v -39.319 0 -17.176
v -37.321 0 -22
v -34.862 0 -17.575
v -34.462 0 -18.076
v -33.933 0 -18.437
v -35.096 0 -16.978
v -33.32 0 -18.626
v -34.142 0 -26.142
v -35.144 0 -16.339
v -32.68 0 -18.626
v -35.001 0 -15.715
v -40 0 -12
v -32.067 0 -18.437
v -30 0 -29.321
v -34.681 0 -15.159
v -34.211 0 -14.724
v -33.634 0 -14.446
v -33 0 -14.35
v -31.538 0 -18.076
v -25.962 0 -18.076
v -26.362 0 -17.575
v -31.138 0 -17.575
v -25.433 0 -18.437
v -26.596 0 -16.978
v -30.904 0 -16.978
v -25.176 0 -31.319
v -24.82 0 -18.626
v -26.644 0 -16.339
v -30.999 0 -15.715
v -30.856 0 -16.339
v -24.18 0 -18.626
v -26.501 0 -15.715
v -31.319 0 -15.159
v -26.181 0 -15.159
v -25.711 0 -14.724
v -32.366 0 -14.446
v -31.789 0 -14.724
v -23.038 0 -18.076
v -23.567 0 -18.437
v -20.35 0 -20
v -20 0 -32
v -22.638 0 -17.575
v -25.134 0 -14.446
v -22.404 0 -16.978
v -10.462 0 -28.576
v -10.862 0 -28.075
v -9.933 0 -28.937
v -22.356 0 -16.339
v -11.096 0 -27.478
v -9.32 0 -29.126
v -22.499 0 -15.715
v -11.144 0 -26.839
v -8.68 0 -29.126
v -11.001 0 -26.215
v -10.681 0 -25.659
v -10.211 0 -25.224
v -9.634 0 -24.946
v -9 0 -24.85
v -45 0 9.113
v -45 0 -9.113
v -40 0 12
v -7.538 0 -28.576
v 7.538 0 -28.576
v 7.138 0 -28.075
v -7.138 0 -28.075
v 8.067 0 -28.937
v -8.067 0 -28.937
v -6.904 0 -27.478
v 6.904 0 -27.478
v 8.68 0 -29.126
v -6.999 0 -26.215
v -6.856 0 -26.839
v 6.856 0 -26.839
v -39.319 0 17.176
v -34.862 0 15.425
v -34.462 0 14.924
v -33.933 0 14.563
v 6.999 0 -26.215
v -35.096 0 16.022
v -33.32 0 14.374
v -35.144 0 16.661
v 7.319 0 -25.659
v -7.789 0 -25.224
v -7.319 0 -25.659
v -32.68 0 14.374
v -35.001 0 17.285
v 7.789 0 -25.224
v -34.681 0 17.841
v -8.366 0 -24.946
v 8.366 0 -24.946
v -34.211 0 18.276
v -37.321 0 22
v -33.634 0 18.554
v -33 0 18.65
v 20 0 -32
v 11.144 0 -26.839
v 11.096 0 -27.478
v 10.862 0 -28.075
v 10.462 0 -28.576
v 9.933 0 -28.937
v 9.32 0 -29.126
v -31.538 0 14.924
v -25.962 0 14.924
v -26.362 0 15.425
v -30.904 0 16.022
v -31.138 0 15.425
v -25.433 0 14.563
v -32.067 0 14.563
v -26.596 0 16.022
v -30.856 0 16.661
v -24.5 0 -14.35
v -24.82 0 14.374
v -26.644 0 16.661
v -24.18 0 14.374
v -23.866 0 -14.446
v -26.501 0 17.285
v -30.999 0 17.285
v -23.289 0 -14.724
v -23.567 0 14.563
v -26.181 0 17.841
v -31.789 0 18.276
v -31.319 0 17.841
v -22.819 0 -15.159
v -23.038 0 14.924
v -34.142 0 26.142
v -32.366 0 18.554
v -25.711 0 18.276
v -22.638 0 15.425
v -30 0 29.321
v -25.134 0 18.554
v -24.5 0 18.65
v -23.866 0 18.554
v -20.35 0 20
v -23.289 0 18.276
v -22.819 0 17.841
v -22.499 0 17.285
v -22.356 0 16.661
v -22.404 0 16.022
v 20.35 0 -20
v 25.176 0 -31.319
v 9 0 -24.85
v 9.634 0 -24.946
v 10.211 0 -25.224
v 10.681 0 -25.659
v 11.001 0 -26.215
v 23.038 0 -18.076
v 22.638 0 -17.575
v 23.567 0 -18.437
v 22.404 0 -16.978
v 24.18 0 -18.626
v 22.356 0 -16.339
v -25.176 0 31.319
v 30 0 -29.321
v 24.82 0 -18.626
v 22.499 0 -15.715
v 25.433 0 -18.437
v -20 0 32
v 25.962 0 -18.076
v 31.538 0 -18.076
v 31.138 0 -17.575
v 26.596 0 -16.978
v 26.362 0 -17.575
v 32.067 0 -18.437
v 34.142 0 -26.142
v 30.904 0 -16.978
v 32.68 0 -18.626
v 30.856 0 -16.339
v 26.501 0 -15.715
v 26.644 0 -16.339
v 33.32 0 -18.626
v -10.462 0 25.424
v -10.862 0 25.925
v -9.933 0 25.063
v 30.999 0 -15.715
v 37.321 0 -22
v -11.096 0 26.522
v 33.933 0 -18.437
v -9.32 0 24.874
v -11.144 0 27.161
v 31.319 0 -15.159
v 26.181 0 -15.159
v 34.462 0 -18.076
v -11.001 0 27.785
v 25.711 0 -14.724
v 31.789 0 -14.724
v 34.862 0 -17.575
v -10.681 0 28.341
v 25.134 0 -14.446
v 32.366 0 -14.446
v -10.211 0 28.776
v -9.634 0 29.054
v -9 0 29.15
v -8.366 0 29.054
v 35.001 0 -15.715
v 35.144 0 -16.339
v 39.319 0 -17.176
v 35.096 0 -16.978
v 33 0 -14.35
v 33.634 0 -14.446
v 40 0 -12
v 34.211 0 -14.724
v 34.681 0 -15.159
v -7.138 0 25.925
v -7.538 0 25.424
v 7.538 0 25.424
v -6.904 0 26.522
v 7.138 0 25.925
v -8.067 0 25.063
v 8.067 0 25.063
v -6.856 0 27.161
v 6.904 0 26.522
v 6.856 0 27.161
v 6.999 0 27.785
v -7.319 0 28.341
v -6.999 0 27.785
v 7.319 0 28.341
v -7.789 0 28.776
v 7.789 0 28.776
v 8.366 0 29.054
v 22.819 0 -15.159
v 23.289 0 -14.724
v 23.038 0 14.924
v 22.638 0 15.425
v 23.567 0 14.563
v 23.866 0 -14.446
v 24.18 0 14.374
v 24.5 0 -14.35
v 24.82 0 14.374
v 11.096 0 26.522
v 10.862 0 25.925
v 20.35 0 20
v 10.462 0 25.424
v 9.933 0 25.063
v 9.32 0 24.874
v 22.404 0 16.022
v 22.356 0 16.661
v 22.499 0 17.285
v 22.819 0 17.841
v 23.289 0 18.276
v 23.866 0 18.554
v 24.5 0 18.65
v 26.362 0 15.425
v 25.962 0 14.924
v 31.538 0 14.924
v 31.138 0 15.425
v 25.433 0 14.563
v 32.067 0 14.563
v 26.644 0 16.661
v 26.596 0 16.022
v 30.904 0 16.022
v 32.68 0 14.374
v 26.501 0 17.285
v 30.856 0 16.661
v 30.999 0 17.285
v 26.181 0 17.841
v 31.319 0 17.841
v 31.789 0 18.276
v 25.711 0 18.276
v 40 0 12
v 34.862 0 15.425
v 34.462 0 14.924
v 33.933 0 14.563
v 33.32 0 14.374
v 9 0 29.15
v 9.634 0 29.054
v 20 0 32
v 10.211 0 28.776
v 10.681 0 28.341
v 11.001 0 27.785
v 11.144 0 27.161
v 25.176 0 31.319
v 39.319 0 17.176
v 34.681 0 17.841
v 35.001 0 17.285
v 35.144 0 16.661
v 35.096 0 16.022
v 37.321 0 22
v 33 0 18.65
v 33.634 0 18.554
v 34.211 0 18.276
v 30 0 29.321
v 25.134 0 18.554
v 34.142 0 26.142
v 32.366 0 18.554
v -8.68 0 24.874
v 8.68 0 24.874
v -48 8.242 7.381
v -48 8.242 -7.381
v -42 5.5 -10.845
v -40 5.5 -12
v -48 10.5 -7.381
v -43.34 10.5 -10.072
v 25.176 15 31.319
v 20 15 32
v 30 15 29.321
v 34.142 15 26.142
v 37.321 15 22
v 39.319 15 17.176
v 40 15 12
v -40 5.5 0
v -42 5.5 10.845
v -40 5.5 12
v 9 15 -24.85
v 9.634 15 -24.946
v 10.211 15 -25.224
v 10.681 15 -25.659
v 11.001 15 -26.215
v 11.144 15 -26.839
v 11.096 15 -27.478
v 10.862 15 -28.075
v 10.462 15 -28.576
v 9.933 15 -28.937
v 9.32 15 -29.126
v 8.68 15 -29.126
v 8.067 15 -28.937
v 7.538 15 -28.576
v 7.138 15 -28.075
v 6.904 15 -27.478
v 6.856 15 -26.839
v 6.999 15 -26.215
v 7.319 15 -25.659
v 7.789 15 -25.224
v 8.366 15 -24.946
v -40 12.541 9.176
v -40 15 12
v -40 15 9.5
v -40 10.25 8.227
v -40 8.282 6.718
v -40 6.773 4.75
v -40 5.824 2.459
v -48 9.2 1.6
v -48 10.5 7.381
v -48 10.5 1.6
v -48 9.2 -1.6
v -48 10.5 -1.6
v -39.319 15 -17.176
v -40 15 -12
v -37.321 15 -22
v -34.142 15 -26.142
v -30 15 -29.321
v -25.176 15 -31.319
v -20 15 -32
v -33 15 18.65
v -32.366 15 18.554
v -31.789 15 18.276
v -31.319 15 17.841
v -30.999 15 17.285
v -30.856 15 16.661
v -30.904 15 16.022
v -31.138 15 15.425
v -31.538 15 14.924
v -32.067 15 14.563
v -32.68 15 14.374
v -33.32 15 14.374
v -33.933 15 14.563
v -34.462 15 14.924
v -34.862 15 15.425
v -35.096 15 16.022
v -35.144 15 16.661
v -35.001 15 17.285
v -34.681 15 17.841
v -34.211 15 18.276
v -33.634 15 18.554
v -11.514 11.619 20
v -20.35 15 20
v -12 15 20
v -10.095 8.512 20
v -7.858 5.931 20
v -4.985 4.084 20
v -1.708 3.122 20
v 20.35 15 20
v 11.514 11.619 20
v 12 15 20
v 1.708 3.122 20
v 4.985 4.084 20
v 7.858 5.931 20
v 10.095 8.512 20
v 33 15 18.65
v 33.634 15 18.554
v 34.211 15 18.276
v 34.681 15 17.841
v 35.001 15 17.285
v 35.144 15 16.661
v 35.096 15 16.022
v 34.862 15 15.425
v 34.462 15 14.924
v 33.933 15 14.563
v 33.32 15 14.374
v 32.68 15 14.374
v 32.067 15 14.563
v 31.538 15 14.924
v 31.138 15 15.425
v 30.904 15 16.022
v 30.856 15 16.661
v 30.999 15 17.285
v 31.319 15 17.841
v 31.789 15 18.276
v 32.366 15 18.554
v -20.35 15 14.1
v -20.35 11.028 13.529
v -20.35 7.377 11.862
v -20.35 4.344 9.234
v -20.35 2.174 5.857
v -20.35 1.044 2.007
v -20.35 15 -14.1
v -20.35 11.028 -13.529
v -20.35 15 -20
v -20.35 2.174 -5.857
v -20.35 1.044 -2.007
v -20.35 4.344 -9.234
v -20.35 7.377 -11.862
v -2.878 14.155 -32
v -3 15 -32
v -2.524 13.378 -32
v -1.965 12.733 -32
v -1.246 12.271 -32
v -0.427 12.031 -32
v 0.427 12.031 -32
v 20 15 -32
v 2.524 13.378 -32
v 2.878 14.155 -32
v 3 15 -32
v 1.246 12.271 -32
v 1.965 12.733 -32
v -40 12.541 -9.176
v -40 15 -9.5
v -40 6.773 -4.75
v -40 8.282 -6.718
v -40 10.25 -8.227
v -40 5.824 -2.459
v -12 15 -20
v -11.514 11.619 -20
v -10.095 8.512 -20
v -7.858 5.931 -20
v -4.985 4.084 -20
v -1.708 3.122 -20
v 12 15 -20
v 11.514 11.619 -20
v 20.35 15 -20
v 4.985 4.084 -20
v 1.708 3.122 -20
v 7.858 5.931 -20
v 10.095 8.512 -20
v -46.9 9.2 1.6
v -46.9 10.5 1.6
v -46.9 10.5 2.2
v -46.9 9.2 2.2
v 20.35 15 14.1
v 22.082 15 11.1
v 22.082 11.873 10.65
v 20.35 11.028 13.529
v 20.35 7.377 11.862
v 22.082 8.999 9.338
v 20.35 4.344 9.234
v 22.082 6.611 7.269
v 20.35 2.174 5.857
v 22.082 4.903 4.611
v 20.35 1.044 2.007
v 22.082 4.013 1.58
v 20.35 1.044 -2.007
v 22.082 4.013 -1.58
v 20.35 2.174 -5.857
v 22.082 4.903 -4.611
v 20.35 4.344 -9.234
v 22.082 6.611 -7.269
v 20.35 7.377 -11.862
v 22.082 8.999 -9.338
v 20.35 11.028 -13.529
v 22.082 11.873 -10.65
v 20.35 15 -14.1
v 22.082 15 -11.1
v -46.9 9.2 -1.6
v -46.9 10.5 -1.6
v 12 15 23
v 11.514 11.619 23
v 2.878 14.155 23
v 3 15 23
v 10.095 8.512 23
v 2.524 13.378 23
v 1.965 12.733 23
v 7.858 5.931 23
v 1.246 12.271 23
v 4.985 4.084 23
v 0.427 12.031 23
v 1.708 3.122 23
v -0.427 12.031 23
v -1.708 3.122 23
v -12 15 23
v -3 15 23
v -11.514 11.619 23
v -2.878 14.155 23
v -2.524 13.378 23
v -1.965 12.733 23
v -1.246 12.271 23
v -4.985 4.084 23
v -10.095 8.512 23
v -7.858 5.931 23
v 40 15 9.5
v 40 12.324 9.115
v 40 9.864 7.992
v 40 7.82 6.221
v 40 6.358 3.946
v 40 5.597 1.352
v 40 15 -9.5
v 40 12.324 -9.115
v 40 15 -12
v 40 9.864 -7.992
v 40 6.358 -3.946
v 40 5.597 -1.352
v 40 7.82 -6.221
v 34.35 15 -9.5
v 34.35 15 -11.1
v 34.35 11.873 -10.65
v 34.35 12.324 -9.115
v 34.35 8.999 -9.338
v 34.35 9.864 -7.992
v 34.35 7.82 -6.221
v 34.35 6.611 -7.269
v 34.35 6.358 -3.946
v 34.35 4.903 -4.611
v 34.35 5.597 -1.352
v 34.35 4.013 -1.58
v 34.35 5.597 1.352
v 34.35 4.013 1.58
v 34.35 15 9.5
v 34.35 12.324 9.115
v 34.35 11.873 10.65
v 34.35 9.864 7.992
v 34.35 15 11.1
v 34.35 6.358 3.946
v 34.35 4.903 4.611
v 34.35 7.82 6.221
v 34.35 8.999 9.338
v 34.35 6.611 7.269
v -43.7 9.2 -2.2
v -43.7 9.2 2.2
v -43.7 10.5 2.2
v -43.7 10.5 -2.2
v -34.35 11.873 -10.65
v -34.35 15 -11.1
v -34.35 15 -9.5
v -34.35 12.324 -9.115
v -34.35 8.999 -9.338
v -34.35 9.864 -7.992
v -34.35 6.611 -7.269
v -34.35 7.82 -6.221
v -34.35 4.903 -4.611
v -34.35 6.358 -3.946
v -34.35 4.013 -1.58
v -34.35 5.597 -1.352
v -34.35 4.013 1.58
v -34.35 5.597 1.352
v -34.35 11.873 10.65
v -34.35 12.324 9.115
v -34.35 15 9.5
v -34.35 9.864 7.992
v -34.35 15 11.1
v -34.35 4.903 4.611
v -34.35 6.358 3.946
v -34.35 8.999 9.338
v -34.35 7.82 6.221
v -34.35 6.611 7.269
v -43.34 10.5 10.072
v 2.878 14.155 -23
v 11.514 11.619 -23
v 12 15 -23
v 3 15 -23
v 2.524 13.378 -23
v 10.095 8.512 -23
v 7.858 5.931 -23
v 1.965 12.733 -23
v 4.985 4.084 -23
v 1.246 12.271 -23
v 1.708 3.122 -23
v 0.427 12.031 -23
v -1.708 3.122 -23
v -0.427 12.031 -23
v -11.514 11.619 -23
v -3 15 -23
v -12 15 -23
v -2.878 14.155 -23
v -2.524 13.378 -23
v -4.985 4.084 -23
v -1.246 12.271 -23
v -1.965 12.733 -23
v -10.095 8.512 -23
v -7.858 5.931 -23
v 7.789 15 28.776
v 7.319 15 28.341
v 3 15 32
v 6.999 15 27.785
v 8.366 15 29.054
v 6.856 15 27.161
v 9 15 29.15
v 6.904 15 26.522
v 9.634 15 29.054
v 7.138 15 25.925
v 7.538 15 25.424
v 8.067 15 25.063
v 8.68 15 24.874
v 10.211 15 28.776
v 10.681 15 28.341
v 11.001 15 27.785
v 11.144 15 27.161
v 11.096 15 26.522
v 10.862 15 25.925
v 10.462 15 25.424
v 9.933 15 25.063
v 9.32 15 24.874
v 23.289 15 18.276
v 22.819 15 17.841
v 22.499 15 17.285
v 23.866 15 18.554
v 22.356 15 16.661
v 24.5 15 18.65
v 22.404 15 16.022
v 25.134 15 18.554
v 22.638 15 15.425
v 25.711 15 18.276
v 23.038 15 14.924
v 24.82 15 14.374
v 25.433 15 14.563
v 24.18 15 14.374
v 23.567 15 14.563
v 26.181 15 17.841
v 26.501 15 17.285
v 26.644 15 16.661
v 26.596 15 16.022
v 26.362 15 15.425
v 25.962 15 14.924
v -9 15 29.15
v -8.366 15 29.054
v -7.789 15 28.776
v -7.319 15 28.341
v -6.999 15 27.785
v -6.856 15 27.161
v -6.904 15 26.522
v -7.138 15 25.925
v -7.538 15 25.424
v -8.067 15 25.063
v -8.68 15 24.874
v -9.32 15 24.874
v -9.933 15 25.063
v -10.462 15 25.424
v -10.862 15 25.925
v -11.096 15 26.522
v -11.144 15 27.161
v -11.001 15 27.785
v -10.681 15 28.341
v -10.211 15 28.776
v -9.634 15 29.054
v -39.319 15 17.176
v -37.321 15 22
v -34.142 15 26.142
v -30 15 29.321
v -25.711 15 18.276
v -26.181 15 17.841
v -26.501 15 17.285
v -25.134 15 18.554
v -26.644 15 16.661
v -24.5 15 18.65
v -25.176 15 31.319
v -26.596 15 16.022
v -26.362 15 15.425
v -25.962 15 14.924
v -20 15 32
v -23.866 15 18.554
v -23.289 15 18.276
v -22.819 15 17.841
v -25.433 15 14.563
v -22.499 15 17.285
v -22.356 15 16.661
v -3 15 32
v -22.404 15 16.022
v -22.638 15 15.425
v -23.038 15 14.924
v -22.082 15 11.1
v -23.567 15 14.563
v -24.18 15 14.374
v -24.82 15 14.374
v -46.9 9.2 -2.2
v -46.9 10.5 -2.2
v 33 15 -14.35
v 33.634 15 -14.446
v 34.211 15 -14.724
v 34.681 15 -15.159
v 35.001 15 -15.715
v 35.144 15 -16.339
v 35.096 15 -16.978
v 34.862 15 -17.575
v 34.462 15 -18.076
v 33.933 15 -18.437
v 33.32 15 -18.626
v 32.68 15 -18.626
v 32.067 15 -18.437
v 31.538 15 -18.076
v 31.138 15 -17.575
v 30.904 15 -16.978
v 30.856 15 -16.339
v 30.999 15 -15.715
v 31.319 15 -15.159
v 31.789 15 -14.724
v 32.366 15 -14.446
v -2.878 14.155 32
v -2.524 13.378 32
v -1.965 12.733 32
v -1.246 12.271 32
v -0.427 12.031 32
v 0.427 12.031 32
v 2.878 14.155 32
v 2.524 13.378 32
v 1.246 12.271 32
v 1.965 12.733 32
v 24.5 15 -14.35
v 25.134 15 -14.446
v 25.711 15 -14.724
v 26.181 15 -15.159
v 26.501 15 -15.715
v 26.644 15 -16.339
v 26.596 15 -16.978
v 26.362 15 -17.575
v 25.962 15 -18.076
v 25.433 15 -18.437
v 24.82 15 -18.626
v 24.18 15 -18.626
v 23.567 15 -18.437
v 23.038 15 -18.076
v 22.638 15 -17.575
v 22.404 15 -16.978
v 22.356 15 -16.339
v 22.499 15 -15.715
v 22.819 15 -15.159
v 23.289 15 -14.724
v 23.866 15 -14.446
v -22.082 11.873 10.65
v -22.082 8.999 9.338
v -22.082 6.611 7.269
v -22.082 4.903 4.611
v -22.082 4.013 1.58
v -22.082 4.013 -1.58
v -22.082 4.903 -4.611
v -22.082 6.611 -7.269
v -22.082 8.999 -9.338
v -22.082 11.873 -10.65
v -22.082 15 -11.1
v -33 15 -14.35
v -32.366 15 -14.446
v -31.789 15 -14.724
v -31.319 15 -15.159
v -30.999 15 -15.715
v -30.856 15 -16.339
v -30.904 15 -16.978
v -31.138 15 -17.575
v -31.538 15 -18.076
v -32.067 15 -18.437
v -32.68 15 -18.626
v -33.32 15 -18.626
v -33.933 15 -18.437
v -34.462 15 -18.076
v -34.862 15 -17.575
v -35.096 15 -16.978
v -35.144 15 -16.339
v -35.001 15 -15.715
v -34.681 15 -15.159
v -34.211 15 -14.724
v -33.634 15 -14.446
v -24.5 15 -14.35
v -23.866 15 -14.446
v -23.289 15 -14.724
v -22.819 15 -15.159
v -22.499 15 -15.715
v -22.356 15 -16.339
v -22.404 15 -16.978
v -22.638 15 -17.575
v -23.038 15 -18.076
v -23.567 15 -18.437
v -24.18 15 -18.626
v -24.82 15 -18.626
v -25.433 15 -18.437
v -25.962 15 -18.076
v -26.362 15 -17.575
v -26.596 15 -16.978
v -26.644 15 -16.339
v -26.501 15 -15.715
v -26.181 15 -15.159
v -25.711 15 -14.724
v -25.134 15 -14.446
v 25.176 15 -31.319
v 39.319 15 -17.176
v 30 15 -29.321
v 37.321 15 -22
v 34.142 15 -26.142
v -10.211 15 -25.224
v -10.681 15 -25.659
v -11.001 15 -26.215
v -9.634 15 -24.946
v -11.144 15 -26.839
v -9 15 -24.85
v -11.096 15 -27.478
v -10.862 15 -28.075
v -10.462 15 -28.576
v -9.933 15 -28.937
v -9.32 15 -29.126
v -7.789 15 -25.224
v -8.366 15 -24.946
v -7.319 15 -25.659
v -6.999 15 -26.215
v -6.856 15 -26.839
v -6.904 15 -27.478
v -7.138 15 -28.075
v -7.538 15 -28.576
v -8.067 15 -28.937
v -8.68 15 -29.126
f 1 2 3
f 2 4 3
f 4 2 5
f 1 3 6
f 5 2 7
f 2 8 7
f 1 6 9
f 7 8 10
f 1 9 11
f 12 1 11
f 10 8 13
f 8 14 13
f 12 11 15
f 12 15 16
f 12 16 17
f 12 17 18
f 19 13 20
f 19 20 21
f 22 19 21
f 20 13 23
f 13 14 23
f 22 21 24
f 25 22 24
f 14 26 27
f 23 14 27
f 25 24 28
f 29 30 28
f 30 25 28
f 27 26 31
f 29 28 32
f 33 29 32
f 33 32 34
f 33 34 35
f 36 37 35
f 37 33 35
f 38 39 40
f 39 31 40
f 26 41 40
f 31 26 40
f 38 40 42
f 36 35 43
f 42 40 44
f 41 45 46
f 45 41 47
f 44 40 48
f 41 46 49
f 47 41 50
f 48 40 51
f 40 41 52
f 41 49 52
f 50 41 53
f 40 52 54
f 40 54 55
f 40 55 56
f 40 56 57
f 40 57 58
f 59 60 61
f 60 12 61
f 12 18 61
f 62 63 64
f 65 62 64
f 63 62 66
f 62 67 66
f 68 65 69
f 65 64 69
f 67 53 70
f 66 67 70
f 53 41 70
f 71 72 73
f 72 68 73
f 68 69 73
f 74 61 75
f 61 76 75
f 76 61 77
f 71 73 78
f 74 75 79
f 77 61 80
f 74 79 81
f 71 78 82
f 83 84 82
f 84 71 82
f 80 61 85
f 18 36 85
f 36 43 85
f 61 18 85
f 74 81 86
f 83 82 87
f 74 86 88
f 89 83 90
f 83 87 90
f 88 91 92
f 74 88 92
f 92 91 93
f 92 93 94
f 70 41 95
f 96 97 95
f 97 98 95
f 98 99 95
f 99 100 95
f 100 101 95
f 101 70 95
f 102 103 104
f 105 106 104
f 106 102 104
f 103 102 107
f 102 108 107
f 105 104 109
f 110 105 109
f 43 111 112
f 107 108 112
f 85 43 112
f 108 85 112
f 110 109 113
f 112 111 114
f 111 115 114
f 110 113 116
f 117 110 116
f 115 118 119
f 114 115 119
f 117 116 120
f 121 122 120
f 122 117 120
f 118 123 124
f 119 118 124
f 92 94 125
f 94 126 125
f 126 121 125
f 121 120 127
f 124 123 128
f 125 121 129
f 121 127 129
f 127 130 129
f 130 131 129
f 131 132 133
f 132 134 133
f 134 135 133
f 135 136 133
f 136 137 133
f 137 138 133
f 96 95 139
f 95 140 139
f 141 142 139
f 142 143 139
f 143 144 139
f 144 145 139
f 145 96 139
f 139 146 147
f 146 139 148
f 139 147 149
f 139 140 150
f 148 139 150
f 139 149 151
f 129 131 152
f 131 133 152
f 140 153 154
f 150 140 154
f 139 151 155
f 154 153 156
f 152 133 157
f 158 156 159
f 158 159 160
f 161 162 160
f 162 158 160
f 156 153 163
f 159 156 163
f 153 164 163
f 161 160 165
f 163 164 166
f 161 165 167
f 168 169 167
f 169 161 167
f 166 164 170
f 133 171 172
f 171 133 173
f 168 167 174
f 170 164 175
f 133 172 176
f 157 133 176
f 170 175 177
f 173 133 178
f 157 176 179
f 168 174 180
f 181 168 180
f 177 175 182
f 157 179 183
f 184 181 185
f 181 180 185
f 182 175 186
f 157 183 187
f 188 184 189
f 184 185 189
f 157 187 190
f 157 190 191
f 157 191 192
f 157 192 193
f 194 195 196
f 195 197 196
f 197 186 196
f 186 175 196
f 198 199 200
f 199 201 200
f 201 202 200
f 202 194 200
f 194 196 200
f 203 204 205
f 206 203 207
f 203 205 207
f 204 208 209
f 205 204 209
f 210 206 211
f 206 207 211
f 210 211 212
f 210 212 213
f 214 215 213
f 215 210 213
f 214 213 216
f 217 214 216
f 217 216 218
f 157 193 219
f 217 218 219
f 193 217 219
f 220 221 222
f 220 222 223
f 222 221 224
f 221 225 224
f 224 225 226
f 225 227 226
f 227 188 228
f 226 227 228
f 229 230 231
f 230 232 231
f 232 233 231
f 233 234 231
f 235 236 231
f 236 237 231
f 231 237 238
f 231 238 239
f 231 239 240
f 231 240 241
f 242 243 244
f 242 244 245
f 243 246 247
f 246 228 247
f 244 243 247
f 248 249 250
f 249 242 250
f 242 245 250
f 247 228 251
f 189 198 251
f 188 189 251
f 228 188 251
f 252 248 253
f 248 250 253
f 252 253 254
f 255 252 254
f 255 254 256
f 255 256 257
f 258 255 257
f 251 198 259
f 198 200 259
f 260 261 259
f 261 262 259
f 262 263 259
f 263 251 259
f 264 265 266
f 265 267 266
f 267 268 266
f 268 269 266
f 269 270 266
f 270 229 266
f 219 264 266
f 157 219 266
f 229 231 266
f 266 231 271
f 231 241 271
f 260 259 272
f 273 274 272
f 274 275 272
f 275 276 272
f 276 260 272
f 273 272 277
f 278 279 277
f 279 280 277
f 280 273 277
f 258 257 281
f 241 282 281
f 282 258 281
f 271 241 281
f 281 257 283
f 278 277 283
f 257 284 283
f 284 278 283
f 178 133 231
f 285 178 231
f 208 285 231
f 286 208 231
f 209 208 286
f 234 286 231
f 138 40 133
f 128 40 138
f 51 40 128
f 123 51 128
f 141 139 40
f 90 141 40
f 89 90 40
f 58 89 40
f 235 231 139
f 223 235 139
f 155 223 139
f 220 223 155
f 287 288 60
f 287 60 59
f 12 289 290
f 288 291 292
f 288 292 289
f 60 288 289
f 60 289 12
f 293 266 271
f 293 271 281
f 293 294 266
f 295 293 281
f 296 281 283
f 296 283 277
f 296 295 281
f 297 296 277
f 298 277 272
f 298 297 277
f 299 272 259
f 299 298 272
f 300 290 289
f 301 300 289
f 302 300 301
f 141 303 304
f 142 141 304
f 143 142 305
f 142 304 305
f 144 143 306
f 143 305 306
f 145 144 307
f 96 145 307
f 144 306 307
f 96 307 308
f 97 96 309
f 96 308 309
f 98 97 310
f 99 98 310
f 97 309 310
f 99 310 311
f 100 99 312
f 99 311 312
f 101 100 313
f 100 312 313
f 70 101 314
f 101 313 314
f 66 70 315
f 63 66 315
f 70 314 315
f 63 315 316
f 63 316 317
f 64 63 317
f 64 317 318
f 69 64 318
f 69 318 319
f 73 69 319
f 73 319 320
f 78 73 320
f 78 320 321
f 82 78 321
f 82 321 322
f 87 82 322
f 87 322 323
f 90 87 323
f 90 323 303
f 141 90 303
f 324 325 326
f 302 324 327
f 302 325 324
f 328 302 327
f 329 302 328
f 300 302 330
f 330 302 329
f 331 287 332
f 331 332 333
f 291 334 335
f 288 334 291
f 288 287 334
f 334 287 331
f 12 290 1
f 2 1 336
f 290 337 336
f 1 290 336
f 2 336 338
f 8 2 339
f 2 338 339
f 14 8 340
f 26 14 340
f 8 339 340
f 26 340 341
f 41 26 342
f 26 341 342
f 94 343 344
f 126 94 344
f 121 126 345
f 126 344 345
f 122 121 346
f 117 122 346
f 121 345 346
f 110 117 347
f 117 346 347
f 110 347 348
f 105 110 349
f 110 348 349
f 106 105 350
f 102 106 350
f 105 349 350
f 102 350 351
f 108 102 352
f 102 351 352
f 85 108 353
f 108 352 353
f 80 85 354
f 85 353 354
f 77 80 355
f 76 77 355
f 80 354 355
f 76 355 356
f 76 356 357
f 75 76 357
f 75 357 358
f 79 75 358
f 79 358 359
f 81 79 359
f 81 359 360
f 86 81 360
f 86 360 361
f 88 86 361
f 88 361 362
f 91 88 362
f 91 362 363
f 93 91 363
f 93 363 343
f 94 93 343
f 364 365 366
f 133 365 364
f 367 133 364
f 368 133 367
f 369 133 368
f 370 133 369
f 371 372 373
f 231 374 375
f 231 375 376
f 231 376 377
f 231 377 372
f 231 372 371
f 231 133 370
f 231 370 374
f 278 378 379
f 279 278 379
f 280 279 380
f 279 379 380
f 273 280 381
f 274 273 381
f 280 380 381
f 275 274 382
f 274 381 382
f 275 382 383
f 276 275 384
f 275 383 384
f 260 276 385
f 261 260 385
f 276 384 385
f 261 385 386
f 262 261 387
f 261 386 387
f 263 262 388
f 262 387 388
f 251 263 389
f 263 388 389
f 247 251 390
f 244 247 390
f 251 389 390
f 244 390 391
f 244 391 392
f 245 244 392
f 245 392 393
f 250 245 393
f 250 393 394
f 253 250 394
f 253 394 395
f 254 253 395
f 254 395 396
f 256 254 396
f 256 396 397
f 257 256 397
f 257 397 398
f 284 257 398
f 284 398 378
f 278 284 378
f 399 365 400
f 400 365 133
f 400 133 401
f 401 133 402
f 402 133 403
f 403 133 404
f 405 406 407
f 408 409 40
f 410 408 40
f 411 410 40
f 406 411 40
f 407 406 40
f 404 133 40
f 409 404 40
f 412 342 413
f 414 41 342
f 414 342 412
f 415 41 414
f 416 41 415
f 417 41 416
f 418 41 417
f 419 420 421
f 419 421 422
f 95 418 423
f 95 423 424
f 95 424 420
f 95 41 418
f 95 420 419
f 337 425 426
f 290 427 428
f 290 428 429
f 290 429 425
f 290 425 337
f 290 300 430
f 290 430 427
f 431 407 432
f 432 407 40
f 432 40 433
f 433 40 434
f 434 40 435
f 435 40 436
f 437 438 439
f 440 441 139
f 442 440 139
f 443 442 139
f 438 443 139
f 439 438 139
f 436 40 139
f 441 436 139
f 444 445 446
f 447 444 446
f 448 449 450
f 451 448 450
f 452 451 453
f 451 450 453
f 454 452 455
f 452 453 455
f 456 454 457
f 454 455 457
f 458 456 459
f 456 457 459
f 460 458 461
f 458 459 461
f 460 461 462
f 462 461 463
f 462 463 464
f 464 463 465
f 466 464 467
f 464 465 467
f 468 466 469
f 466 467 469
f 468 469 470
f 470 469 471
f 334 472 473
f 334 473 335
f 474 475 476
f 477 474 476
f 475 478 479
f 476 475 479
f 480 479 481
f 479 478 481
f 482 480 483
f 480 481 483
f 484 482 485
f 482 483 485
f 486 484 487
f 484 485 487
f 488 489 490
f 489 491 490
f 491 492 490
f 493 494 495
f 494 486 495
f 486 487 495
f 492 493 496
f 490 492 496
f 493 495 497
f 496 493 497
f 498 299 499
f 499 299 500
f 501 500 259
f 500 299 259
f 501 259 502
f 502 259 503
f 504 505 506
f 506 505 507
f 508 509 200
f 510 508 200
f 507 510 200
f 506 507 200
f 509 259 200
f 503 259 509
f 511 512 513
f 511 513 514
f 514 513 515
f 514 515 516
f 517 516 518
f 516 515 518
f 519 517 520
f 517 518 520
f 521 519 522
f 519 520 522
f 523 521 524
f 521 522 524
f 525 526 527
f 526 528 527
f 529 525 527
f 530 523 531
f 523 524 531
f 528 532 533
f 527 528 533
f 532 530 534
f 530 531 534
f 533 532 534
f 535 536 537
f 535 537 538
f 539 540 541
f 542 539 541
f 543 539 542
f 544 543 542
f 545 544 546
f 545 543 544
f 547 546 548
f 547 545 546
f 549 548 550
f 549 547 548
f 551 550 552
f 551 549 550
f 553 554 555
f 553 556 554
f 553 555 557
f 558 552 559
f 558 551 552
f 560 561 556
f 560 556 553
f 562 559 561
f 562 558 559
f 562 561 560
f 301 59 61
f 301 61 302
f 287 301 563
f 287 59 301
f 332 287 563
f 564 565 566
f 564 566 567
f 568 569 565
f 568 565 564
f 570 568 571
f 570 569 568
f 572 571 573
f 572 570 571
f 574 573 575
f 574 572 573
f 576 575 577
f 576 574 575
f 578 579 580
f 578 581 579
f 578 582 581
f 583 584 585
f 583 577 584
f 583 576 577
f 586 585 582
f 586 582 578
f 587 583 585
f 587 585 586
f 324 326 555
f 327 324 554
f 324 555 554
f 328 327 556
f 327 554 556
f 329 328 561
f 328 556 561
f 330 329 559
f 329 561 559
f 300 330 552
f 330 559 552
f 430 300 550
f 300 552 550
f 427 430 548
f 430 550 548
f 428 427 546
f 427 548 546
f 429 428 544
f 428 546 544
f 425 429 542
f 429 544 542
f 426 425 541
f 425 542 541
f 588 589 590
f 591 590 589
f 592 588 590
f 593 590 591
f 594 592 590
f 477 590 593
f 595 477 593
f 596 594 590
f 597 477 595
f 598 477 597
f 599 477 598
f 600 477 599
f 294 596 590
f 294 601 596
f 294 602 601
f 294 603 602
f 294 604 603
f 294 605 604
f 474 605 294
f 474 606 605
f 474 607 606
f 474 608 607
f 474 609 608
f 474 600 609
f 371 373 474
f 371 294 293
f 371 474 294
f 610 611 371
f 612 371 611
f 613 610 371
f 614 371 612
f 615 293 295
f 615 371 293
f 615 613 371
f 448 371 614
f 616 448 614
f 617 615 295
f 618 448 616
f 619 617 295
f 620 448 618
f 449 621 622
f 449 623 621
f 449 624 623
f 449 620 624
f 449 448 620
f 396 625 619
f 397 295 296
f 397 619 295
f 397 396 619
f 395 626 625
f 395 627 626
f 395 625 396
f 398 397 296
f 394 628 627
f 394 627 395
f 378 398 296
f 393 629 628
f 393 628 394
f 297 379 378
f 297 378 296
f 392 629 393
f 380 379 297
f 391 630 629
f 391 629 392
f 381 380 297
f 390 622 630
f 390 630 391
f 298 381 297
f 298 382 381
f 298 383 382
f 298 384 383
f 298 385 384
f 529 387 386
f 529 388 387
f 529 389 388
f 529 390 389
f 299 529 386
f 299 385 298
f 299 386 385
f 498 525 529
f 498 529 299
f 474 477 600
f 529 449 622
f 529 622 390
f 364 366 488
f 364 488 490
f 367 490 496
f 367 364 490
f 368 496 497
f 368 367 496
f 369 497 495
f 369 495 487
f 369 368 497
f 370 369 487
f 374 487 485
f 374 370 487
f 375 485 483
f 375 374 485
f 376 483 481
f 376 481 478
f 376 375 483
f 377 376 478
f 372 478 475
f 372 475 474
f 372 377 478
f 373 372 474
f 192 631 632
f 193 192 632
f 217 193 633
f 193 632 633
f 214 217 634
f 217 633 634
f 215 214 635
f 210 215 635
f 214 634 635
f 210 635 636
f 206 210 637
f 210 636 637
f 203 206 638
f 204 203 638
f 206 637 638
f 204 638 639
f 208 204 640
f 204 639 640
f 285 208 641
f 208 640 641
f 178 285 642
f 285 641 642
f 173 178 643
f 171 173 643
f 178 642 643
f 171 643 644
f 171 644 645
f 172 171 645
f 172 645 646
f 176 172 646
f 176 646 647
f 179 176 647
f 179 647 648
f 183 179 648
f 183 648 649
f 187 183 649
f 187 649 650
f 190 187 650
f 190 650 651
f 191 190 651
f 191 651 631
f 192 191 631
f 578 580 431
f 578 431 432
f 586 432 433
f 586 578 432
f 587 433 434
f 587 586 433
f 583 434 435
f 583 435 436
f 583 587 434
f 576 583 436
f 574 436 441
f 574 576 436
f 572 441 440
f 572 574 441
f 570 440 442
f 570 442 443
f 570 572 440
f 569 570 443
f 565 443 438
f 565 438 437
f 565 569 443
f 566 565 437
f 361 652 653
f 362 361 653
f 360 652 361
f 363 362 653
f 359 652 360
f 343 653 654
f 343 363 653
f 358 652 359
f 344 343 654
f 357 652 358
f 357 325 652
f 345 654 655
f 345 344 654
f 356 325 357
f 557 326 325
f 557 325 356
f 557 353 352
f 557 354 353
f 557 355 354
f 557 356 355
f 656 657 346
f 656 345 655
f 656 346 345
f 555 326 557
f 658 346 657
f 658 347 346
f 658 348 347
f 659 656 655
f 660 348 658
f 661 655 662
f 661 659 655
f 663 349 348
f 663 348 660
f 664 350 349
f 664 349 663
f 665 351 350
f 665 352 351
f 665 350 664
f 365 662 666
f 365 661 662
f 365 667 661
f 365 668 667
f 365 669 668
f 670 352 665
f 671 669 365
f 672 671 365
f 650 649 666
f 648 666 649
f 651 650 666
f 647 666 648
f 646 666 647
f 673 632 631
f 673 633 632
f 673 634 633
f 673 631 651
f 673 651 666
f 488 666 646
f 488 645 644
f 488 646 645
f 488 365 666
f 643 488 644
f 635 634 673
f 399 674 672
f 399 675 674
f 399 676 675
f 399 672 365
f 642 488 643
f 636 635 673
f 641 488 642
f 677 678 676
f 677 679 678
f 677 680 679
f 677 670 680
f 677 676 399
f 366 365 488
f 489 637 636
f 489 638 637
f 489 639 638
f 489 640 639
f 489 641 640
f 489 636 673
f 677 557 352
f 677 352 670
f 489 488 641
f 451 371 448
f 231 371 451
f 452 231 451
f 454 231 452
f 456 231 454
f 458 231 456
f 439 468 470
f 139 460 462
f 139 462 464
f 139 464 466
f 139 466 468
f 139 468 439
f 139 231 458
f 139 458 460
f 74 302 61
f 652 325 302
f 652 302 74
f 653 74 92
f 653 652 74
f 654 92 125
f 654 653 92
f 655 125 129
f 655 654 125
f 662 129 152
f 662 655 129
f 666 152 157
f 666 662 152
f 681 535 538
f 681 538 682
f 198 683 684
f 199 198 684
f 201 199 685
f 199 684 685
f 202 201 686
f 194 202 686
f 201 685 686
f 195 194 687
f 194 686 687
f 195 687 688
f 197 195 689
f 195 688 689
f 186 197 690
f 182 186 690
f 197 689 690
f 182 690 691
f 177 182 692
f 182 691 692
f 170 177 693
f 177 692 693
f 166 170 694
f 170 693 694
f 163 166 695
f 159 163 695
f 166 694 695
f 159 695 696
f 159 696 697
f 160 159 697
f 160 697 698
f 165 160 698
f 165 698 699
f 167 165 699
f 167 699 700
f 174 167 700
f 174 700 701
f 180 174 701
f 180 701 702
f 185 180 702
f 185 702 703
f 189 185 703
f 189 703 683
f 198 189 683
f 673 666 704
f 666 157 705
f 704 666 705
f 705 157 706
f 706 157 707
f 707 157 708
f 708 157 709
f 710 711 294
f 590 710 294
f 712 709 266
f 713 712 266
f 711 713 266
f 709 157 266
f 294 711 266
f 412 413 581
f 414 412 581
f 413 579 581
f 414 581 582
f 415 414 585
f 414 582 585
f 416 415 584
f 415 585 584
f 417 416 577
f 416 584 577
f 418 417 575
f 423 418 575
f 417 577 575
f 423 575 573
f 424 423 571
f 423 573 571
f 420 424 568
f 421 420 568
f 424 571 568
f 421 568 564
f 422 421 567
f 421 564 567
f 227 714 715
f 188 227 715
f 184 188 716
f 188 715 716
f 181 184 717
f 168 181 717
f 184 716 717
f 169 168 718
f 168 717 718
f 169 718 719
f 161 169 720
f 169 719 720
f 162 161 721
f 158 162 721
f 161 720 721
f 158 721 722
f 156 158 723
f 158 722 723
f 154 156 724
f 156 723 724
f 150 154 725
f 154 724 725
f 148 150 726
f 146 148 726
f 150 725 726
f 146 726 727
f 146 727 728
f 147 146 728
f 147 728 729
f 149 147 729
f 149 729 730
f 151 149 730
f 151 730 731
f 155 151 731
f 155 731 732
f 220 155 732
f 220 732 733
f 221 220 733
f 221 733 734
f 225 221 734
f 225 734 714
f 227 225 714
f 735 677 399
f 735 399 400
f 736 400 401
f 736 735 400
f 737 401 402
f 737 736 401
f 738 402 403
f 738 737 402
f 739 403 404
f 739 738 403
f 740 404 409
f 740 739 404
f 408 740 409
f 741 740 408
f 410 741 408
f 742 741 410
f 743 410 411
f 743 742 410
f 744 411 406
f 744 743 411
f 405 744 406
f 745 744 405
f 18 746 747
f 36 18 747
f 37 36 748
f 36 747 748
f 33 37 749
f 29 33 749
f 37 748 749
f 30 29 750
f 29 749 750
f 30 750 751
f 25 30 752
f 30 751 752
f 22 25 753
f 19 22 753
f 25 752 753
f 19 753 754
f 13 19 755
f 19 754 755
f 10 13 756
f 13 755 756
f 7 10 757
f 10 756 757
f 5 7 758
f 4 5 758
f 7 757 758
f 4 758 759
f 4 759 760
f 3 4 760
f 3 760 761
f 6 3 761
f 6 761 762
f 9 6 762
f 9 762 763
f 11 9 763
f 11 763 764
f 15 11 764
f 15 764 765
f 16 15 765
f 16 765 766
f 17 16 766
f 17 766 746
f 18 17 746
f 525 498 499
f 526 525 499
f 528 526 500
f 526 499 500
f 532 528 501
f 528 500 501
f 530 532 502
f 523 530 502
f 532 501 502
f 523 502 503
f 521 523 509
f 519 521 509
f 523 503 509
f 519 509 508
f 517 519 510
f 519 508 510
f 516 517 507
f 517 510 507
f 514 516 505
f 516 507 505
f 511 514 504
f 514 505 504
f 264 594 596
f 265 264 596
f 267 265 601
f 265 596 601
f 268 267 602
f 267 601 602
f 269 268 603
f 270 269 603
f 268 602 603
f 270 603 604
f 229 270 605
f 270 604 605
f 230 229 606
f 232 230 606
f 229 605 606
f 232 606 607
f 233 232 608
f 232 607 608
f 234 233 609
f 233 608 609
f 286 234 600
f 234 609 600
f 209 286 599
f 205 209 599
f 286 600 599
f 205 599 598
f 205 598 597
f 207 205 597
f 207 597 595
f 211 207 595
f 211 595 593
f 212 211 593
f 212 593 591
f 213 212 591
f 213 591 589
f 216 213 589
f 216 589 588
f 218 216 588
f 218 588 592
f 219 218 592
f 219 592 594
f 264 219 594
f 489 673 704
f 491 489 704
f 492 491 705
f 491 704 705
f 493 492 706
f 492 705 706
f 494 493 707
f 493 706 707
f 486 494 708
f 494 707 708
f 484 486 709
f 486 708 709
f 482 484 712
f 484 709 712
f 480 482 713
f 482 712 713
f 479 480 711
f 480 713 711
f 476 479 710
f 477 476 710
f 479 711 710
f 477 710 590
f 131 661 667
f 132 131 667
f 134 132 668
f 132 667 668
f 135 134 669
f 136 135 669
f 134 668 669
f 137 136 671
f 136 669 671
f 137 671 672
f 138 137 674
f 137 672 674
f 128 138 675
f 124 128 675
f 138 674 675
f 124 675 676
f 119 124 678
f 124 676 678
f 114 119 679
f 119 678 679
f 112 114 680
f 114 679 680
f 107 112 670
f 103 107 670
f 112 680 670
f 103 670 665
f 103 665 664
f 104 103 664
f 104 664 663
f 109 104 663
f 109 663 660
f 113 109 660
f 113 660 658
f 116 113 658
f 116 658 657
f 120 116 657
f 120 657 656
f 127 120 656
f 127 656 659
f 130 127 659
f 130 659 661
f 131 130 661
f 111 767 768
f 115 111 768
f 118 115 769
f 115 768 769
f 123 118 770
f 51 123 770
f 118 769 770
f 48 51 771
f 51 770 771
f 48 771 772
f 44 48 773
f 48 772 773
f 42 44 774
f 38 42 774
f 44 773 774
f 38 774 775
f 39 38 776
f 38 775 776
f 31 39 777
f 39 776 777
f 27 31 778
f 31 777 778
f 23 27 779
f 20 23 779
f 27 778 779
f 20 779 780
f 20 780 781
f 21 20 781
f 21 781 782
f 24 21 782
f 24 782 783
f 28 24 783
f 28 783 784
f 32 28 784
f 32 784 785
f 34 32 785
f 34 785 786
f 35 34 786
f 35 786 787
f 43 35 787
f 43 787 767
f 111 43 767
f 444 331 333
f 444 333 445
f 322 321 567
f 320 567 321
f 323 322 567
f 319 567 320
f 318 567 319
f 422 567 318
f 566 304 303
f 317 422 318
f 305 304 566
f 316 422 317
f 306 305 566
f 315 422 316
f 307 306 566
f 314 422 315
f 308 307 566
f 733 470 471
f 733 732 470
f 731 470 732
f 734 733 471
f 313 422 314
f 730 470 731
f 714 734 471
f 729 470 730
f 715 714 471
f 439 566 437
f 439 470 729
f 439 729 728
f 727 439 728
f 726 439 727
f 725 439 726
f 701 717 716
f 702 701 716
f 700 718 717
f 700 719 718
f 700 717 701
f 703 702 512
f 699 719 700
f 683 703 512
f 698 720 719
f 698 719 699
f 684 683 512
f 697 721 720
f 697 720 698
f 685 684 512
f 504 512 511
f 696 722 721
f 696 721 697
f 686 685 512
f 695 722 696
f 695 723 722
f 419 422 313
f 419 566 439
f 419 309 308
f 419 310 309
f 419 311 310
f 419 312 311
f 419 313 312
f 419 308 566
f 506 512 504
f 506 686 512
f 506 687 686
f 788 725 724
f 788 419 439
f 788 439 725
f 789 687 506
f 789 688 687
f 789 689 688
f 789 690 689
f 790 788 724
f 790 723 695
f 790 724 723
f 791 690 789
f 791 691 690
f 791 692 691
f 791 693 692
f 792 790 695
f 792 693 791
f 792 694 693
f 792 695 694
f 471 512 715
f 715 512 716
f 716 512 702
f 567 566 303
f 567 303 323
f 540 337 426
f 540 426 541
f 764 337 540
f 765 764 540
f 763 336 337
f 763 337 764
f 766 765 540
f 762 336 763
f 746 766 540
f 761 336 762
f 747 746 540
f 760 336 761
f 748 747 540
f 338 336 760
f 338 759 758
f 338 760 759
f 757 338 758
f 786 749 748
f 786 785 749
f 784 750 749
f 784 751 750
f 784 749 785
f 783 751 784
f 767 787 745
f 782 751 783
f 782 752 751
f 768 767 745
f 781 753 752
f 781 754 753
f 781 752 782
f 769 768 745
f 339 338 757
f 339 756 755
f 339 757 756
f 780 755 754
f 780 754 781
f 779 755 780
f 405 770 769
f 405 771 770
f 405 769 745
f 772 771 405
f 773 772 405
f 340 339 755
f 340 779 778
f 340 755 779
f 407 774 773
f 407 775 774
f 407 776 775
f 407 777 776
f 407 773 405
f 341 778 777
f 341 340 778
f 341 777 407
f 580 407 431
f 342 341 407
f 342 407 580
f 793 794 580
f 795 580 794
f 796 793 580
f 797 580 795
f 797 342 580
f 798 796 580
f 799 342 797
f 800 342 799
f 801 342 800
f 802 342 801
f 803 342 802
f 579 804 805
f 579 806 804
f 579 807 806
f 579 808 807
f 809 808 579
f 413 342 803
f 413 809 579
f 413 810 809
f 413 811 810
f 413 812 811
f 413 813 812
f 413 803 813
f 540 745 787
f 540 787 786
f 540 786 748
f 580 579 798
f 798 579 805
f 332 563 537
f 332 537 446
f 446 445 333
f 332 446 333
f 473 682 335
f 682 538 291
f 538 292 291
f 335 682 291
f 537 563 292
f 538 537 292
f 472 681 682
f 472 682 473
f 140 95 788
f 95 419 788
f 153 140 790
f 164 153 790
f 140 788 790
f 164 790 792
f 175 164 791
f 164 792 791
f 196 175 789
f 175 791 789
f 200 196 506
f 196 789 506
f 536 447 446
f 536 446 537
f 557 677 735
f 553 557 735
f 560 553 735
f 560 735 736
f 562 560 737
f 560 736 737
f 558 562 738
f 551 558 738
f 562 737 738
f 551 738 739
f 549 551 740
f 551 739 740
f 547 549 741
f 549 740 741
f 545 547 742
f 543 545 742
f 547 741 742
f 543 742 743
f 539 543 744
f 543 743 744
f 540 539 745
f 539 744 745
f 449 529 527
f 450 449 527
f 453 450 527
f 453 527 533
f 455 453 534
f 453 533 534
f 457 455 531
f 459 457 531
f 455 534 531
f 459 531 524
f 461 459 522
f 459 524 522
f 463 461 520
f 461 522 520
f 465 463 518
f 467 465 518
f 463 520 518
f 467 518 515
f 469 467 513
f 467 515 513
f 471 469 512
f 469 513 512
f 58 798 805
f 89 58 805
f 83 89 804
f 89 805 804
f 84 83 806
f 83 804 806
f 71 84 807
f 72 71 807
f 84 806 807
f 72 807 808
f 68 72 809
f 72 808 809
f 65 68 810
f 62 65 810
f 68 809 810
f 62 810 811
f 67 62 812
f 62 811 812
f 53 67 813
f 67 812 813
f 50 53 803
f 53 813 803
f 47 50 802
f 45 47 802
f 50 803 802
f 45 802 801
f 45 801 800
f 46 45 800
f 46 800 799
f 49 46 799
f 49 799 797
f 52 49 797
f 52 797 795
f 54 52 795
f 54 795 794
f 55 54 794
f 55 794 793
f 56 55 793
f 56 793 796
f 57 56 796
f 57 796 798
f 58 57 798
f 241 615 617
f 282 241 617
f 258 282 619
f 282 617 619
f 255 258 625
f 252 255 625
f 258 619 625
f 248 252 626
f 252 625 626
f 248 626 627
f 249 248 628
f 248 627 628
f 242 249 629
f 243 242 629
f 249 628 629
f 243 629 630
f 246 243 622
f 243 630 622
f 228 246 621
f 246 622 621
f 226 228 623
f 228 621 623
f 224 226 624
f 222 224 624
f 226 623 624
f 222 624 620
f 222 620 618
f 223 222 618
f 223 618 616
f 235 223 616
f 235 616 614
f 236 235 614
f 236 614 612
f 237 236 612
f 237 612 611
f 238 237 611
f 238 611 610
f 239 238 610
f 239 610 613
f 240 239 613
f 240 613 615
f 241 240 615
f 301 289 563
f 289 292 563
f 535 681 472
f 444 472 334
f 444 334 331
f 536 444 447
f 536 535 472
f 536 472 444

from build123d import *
from OCP.BRepFilletAPI import BRepFilletAPI_MakeChamfer

# Parameters (mm, degrees)
SKETCH1_W           = 80
SKETCH1_H           = 64
SKETCH1_W_2         = 40.7
SKETCH1_H_2         = 40
BOSS_EXTRUDE1_DEPTH = 15
SKETCH3_W           = 14
SKETCH3_H           = 11.1
SKETCH4_R           = 9.5
CUT_EXTRUDE2_DEPTH  = 88.458561616
SKETCH5_R           = 3
CUT_EXTRUDE3_DEPTH  = 77.948034413
SKETCH8_R           = 2.15
CUT_EXTRUDE6_DEPTH  = 54.37602458
FILLET1_R           = 20
CHAMFER1_SIZE       = 3
CHAMFER1_SIZE2      = 1.732050808
SKETCH9_W           = 12
SKETCH9_H           = 3
SKETCH10_W          = 24
SKETCH10_H          = 5.5
BOSS_EXTRUDE2_DEPTH = 8
BOSS_EXTRUDE3_START = 2
SKETCH12_W          = 24
SKETCH12_H          = 3.7
BOSS_EXTRUDE3_DEPTH = 6
BOSS_EXTRUDE4_DEPTH = 1.3
CHAMFER2_SIZE2      = 1.339745962
CHAMFER2_SIZE       = 5
CHAMFER3_SIZE       = 8
CHAMFER3_SIZE_2     = 4.618802154
CHAMFER4_SIZE       = 3
CHAMFER4_SIZE2      = 8.242432258


with BuildPart() as part:
    # Sketch1 → Boss-Extrude1 (new body)
    with BuildSketch(Plane(origin=(0, 0, 0), x_dir=(1, 0, 0), z_dir=(0, 1, 0))):
        Rectangle(SKETCH1_W, SKETCH1_H)
        Rectangle(SKETCH1_W_2, SKETCH1_H_2, mode=Mode.SUBTRACT)
    extrude(amount=BOSS_EXTRUDE1_DEPTH)

    # Sketch3 → Cut-Revolve1 (revolve, cut)
    with BuildSketch(Plane(origin=(0, 15, 0), x_dir=(1, 0, 0), z_dir=(0, 1, 0))):
        with Locations((27.35, -5.55)):
            Rectangle(SKETCH3_W, SKETCH3_H)
        with Locations((-27.35, -5.55)):
            Rectangle(SKETCH3_W, SKETCH3_H)
    revolve(axis=Axis((20.35, 15, 0), (1, 0, 0)), mode=Mode.SUBTRACT)

    # Sketch4 → Cut-Extrude2 (cut, through all)
    with BuildSketch(Plane(origin=(40, 0, 0), x_dir=(0, 0, -1), z_dir=(1, 0, 0))):
        with Locations((0, 15)):
            Circle(SKETCH4_R)
    extrude(amount=-CUT_EXTRUDE2_DEPTH, mode=Mode.SUBTRACT)

    # Sketch5 → Cut-Extrude3 (cut, through all)
    with BuildSketch(Plane.XY.offset(32)):
        with Locations((0, 15)):
            Circle(SKETCH5_R)
    extrude(amount=-CUT_EXTRUDE3_DEPTH, mode=Mode.SUBTRACT)

    # Sketch8 → Cut-Extrude6 (cut, through all)
    with BuildSketch(Plane(origin=(0, 15, 0), x_dir=(1, 0, 0), z_dir=(0, 1, 0))):
        with Locations(Location((24.5, 16.5, 0), (0, 0, 270))):
            Circle(SKETCH8_R)
        with Locations(Location((24.5, -16.5, 0), (0, 0, 270))):
            Circle(SKETCH8_R)
        with Locations(Location((-24.5, -16.5, 0), (0, 0, 270))):
            Circle(SKETCH8_R)
        with Locations(Location((-24.5, 16.5, 0), (0, 0, 270))):
            Circle(SKETCH8_R)
        with Locations(Location((9, -27, 0), (0, 0, 270))):
            Circle(SKETCH8_R)
        with Locations(Location((-9, -27, 0), (0, 0, 270))):
            Circle(SKETCH8_R)
        with Locations(Location((-9, 27, 0), (0, 0, 270))):
            Circle(SKETCH8_R)
        with Locations(Location((9, 27, 0), (0, 0, 270))):
            Circle(SKETCH8_R)
        with Locations(Location((-33, 16.5, 0), (0, 0, 270))):
            Circle(SKETCH8_R)
        with Locations(Location((-33, -16.5, 0), (0, 0, 270))):
            Circle(SKETCH8_R)
        with Locations(Location((33, -16.5, 0), (0, 0, 270))):
            Circle(SKETCH8_R)
        with Locations(Location((33, 16.5, 0), (0, 0, 270))):
            Circle(SKETCH8_R)
    extrude(amount=-CUT_EXTRUDE6_DEPTH, mode=Mode.SUBTRACT)

    # Fillet1
    fillet1_edges = [part.edges().sort_by_distance(p)[0] for p in [
        (-40, 7.5, -32),
        (40, 7.5, -32),
        (40, 7.5, 32),
        (-40, 7.5, 32),
    ]]
    fillet(fillet1_edges, radius=FILLET1_R)

    # Chamfer1: one chamfer whose edges measure the first distance from different faces: ONE call of the kernel's chamfer builder (chamfer() names one face for all edges)
    chamfer1_edges_1 = [part.edges().sort_by_distance(p)[0] for p in [
        (20.35, 3.9, 0),
    ]]
    chamfer1_side_1 = [part.faces().sort_by_distance(p)[0] for p in [
        (20.35, 0.427200187, 0),
    ]]
    chamfer1_edges_2 = [part.edges().sort_by_distance(p)[0] for p in [
        (-20.35, 3.9, 0),
    ]]
    chamfer1_side_2 = [part.faces().sort_by_distance(p)[0] for p in [
        (-20.35, 0.427200187, 0),
    ]]
    chamfer1 = BRepFilletAPI_MakeChamfer(part.part.solid().wrapped)
    for e in chamfer1_edges_1:
        chamfer1.Add(CHAMFER1_SIZE, CHAMFER1_SIZE2, e.wrapped, chamfer1_side_1[0].wrapped)  # the first distance lies on this face
    for e in chamfer1_edges_2:
        chamfer1.Add(CHAMFER1_SIZE, CHAMFER1_SIZE2, e.wrapped, chamfer1_side_2[0].wrapped)  # the first distance lies on this face
    add(Compound.cast(chamfer1.Shape()), mode=Mode.REPLACE)

    # Sketch9 → Cut-Revolve2 (revolve, cut)
    with BuildSketch(Plane(origin=(0, 15, 0), x_dir=(1, 0, 0), z_dir=(0, 1, 0))):
        with Locations((-6, -21.5)):
            Rectangle(SKETCH9_W, SKETCH9_H)
        with Locations((-6, 21.5)):
            Rectangle(SKETCH9_W, SKETCH9_H)
    revolve(axis=Axis((0, 15, -29.871415895), (0, 0, 1)), mode=Mode.SUBTRACT)

    # Sketch10 → Boss-Extrude2 (add)
    with BuildSketch(Plane.ZY.offset(40)):
        with Locations((0, 2.75)):
            Rectangle(SKETCH10_W, SKETCH10_H)
    extrude(amount=BOSS_EXTRUDE2_DEPTH)

    # Sketch12 → Boss-Extrude3 (add)
    with BuildSketch(Plane.ZY.offset(40).offset(BOSS_EXTRUDE3_START)):
        with Locations((0, 7.35)):
            Rectangle(SKETCH12_W, SKETCH12_H)
    extrude(amount=BOSS_EXTRUDE3_DEPTH)

    # Sketch13 → Boss-Extrude4 (add)
    with BuildSketch(Plane(origin=(0, 9.2, 0), x_dir=(1, 0, 0), z_dir=(0, 1, 0))):
        Polygon((-46.9, 2.2), (-46.9, 1.6), (-48, 1.6), (-48, 12), (-42, 12), (-42, -12), (-48, -12), (-48, -1.6), (-46.9, -1.6), (-46.9, -2.2), (-43.7, -2.2), (-43.7, 2.2), align=None)
    extrude(amount=BOSS_EXTRUDE4_DEPTH)

    # Chamfer2
    chamfer2_edges = [part.edges().sort_by_distance(p)[0] for p in [
        (-42, 10.5, 0),
    ]]
    chamfer2_side = [part.faces().sort_by_distance(p)[0] for p in [
        (-42, 10.473205081, 0),
    ]]
    chamfer(chamfer2_edges, length=CHAMFER2_SIZE - 0.0001, length2=CHAMFER2_SIZE2 - 0.0001, reference=chamfer2_side[0])  # a hair under: the kernel refuses the full size

    # Chamfer3
    chamfer3_edges_1 = [part.edges().sort_by_distance(p)[0] for p in [
        (-48, 5.25, 12),
    ]]
    chamfer3_side_1 = [part.faces().sort_by_distance(p)[0] for p in [
        (-47.907623957, 5.25, 12),
    ]]
    chamfer3_edges_2 = [part.edges().sort_by_distance(p)[0] for p in [
        (-48, 5.25, -12),
    ]]
    chamfer3_side_2 = [part.faces().sort_by_distance(p)[0] for p in [
        (-47.907623957, 5.25, -12),
    ]]
    chamfer3 = BRepFilletAPI_MakeChamfer(part.part.solid().wrapped)
    for e in chamfer3_edges_1:
        chamfer3.Add(CHAMFER3_SIZE - 0.0001, CHAMFER3_SIZE_2 - 0.0001, e.wrapped, chamfer3_side_1[0].wrapped)
    for e in chamfer3_edges_2:
        chamfer3.Add(CHAMFER3_SIZE - 0.0001, CHAMFER3_SIZE_2 - 0.0001, e.wrapped, chamfer3_side_2[0].wrapped)
    add(Compound.cast(chamfer3.Shape()), mode=Mode.REPLACE)  # a hair under: the kernel refuses the full size

    # Chamfer4
    chamfer4_edges = [part.edges().sort_by_distance(p)[0] for p in [
        (-48, 0, 0),
    ]]
    chamfer4_side = [part.faces().sort_by_distance(p)[0] for p in [
        (-40.00005, 0, 10.911882359),
    ]]
    chamfer(chamfer4_edges, length=CHAMFER4_SIZE, length2=CHAMFER4_SIZE2, reference=chamfer4_side[0])


solid = part.part
